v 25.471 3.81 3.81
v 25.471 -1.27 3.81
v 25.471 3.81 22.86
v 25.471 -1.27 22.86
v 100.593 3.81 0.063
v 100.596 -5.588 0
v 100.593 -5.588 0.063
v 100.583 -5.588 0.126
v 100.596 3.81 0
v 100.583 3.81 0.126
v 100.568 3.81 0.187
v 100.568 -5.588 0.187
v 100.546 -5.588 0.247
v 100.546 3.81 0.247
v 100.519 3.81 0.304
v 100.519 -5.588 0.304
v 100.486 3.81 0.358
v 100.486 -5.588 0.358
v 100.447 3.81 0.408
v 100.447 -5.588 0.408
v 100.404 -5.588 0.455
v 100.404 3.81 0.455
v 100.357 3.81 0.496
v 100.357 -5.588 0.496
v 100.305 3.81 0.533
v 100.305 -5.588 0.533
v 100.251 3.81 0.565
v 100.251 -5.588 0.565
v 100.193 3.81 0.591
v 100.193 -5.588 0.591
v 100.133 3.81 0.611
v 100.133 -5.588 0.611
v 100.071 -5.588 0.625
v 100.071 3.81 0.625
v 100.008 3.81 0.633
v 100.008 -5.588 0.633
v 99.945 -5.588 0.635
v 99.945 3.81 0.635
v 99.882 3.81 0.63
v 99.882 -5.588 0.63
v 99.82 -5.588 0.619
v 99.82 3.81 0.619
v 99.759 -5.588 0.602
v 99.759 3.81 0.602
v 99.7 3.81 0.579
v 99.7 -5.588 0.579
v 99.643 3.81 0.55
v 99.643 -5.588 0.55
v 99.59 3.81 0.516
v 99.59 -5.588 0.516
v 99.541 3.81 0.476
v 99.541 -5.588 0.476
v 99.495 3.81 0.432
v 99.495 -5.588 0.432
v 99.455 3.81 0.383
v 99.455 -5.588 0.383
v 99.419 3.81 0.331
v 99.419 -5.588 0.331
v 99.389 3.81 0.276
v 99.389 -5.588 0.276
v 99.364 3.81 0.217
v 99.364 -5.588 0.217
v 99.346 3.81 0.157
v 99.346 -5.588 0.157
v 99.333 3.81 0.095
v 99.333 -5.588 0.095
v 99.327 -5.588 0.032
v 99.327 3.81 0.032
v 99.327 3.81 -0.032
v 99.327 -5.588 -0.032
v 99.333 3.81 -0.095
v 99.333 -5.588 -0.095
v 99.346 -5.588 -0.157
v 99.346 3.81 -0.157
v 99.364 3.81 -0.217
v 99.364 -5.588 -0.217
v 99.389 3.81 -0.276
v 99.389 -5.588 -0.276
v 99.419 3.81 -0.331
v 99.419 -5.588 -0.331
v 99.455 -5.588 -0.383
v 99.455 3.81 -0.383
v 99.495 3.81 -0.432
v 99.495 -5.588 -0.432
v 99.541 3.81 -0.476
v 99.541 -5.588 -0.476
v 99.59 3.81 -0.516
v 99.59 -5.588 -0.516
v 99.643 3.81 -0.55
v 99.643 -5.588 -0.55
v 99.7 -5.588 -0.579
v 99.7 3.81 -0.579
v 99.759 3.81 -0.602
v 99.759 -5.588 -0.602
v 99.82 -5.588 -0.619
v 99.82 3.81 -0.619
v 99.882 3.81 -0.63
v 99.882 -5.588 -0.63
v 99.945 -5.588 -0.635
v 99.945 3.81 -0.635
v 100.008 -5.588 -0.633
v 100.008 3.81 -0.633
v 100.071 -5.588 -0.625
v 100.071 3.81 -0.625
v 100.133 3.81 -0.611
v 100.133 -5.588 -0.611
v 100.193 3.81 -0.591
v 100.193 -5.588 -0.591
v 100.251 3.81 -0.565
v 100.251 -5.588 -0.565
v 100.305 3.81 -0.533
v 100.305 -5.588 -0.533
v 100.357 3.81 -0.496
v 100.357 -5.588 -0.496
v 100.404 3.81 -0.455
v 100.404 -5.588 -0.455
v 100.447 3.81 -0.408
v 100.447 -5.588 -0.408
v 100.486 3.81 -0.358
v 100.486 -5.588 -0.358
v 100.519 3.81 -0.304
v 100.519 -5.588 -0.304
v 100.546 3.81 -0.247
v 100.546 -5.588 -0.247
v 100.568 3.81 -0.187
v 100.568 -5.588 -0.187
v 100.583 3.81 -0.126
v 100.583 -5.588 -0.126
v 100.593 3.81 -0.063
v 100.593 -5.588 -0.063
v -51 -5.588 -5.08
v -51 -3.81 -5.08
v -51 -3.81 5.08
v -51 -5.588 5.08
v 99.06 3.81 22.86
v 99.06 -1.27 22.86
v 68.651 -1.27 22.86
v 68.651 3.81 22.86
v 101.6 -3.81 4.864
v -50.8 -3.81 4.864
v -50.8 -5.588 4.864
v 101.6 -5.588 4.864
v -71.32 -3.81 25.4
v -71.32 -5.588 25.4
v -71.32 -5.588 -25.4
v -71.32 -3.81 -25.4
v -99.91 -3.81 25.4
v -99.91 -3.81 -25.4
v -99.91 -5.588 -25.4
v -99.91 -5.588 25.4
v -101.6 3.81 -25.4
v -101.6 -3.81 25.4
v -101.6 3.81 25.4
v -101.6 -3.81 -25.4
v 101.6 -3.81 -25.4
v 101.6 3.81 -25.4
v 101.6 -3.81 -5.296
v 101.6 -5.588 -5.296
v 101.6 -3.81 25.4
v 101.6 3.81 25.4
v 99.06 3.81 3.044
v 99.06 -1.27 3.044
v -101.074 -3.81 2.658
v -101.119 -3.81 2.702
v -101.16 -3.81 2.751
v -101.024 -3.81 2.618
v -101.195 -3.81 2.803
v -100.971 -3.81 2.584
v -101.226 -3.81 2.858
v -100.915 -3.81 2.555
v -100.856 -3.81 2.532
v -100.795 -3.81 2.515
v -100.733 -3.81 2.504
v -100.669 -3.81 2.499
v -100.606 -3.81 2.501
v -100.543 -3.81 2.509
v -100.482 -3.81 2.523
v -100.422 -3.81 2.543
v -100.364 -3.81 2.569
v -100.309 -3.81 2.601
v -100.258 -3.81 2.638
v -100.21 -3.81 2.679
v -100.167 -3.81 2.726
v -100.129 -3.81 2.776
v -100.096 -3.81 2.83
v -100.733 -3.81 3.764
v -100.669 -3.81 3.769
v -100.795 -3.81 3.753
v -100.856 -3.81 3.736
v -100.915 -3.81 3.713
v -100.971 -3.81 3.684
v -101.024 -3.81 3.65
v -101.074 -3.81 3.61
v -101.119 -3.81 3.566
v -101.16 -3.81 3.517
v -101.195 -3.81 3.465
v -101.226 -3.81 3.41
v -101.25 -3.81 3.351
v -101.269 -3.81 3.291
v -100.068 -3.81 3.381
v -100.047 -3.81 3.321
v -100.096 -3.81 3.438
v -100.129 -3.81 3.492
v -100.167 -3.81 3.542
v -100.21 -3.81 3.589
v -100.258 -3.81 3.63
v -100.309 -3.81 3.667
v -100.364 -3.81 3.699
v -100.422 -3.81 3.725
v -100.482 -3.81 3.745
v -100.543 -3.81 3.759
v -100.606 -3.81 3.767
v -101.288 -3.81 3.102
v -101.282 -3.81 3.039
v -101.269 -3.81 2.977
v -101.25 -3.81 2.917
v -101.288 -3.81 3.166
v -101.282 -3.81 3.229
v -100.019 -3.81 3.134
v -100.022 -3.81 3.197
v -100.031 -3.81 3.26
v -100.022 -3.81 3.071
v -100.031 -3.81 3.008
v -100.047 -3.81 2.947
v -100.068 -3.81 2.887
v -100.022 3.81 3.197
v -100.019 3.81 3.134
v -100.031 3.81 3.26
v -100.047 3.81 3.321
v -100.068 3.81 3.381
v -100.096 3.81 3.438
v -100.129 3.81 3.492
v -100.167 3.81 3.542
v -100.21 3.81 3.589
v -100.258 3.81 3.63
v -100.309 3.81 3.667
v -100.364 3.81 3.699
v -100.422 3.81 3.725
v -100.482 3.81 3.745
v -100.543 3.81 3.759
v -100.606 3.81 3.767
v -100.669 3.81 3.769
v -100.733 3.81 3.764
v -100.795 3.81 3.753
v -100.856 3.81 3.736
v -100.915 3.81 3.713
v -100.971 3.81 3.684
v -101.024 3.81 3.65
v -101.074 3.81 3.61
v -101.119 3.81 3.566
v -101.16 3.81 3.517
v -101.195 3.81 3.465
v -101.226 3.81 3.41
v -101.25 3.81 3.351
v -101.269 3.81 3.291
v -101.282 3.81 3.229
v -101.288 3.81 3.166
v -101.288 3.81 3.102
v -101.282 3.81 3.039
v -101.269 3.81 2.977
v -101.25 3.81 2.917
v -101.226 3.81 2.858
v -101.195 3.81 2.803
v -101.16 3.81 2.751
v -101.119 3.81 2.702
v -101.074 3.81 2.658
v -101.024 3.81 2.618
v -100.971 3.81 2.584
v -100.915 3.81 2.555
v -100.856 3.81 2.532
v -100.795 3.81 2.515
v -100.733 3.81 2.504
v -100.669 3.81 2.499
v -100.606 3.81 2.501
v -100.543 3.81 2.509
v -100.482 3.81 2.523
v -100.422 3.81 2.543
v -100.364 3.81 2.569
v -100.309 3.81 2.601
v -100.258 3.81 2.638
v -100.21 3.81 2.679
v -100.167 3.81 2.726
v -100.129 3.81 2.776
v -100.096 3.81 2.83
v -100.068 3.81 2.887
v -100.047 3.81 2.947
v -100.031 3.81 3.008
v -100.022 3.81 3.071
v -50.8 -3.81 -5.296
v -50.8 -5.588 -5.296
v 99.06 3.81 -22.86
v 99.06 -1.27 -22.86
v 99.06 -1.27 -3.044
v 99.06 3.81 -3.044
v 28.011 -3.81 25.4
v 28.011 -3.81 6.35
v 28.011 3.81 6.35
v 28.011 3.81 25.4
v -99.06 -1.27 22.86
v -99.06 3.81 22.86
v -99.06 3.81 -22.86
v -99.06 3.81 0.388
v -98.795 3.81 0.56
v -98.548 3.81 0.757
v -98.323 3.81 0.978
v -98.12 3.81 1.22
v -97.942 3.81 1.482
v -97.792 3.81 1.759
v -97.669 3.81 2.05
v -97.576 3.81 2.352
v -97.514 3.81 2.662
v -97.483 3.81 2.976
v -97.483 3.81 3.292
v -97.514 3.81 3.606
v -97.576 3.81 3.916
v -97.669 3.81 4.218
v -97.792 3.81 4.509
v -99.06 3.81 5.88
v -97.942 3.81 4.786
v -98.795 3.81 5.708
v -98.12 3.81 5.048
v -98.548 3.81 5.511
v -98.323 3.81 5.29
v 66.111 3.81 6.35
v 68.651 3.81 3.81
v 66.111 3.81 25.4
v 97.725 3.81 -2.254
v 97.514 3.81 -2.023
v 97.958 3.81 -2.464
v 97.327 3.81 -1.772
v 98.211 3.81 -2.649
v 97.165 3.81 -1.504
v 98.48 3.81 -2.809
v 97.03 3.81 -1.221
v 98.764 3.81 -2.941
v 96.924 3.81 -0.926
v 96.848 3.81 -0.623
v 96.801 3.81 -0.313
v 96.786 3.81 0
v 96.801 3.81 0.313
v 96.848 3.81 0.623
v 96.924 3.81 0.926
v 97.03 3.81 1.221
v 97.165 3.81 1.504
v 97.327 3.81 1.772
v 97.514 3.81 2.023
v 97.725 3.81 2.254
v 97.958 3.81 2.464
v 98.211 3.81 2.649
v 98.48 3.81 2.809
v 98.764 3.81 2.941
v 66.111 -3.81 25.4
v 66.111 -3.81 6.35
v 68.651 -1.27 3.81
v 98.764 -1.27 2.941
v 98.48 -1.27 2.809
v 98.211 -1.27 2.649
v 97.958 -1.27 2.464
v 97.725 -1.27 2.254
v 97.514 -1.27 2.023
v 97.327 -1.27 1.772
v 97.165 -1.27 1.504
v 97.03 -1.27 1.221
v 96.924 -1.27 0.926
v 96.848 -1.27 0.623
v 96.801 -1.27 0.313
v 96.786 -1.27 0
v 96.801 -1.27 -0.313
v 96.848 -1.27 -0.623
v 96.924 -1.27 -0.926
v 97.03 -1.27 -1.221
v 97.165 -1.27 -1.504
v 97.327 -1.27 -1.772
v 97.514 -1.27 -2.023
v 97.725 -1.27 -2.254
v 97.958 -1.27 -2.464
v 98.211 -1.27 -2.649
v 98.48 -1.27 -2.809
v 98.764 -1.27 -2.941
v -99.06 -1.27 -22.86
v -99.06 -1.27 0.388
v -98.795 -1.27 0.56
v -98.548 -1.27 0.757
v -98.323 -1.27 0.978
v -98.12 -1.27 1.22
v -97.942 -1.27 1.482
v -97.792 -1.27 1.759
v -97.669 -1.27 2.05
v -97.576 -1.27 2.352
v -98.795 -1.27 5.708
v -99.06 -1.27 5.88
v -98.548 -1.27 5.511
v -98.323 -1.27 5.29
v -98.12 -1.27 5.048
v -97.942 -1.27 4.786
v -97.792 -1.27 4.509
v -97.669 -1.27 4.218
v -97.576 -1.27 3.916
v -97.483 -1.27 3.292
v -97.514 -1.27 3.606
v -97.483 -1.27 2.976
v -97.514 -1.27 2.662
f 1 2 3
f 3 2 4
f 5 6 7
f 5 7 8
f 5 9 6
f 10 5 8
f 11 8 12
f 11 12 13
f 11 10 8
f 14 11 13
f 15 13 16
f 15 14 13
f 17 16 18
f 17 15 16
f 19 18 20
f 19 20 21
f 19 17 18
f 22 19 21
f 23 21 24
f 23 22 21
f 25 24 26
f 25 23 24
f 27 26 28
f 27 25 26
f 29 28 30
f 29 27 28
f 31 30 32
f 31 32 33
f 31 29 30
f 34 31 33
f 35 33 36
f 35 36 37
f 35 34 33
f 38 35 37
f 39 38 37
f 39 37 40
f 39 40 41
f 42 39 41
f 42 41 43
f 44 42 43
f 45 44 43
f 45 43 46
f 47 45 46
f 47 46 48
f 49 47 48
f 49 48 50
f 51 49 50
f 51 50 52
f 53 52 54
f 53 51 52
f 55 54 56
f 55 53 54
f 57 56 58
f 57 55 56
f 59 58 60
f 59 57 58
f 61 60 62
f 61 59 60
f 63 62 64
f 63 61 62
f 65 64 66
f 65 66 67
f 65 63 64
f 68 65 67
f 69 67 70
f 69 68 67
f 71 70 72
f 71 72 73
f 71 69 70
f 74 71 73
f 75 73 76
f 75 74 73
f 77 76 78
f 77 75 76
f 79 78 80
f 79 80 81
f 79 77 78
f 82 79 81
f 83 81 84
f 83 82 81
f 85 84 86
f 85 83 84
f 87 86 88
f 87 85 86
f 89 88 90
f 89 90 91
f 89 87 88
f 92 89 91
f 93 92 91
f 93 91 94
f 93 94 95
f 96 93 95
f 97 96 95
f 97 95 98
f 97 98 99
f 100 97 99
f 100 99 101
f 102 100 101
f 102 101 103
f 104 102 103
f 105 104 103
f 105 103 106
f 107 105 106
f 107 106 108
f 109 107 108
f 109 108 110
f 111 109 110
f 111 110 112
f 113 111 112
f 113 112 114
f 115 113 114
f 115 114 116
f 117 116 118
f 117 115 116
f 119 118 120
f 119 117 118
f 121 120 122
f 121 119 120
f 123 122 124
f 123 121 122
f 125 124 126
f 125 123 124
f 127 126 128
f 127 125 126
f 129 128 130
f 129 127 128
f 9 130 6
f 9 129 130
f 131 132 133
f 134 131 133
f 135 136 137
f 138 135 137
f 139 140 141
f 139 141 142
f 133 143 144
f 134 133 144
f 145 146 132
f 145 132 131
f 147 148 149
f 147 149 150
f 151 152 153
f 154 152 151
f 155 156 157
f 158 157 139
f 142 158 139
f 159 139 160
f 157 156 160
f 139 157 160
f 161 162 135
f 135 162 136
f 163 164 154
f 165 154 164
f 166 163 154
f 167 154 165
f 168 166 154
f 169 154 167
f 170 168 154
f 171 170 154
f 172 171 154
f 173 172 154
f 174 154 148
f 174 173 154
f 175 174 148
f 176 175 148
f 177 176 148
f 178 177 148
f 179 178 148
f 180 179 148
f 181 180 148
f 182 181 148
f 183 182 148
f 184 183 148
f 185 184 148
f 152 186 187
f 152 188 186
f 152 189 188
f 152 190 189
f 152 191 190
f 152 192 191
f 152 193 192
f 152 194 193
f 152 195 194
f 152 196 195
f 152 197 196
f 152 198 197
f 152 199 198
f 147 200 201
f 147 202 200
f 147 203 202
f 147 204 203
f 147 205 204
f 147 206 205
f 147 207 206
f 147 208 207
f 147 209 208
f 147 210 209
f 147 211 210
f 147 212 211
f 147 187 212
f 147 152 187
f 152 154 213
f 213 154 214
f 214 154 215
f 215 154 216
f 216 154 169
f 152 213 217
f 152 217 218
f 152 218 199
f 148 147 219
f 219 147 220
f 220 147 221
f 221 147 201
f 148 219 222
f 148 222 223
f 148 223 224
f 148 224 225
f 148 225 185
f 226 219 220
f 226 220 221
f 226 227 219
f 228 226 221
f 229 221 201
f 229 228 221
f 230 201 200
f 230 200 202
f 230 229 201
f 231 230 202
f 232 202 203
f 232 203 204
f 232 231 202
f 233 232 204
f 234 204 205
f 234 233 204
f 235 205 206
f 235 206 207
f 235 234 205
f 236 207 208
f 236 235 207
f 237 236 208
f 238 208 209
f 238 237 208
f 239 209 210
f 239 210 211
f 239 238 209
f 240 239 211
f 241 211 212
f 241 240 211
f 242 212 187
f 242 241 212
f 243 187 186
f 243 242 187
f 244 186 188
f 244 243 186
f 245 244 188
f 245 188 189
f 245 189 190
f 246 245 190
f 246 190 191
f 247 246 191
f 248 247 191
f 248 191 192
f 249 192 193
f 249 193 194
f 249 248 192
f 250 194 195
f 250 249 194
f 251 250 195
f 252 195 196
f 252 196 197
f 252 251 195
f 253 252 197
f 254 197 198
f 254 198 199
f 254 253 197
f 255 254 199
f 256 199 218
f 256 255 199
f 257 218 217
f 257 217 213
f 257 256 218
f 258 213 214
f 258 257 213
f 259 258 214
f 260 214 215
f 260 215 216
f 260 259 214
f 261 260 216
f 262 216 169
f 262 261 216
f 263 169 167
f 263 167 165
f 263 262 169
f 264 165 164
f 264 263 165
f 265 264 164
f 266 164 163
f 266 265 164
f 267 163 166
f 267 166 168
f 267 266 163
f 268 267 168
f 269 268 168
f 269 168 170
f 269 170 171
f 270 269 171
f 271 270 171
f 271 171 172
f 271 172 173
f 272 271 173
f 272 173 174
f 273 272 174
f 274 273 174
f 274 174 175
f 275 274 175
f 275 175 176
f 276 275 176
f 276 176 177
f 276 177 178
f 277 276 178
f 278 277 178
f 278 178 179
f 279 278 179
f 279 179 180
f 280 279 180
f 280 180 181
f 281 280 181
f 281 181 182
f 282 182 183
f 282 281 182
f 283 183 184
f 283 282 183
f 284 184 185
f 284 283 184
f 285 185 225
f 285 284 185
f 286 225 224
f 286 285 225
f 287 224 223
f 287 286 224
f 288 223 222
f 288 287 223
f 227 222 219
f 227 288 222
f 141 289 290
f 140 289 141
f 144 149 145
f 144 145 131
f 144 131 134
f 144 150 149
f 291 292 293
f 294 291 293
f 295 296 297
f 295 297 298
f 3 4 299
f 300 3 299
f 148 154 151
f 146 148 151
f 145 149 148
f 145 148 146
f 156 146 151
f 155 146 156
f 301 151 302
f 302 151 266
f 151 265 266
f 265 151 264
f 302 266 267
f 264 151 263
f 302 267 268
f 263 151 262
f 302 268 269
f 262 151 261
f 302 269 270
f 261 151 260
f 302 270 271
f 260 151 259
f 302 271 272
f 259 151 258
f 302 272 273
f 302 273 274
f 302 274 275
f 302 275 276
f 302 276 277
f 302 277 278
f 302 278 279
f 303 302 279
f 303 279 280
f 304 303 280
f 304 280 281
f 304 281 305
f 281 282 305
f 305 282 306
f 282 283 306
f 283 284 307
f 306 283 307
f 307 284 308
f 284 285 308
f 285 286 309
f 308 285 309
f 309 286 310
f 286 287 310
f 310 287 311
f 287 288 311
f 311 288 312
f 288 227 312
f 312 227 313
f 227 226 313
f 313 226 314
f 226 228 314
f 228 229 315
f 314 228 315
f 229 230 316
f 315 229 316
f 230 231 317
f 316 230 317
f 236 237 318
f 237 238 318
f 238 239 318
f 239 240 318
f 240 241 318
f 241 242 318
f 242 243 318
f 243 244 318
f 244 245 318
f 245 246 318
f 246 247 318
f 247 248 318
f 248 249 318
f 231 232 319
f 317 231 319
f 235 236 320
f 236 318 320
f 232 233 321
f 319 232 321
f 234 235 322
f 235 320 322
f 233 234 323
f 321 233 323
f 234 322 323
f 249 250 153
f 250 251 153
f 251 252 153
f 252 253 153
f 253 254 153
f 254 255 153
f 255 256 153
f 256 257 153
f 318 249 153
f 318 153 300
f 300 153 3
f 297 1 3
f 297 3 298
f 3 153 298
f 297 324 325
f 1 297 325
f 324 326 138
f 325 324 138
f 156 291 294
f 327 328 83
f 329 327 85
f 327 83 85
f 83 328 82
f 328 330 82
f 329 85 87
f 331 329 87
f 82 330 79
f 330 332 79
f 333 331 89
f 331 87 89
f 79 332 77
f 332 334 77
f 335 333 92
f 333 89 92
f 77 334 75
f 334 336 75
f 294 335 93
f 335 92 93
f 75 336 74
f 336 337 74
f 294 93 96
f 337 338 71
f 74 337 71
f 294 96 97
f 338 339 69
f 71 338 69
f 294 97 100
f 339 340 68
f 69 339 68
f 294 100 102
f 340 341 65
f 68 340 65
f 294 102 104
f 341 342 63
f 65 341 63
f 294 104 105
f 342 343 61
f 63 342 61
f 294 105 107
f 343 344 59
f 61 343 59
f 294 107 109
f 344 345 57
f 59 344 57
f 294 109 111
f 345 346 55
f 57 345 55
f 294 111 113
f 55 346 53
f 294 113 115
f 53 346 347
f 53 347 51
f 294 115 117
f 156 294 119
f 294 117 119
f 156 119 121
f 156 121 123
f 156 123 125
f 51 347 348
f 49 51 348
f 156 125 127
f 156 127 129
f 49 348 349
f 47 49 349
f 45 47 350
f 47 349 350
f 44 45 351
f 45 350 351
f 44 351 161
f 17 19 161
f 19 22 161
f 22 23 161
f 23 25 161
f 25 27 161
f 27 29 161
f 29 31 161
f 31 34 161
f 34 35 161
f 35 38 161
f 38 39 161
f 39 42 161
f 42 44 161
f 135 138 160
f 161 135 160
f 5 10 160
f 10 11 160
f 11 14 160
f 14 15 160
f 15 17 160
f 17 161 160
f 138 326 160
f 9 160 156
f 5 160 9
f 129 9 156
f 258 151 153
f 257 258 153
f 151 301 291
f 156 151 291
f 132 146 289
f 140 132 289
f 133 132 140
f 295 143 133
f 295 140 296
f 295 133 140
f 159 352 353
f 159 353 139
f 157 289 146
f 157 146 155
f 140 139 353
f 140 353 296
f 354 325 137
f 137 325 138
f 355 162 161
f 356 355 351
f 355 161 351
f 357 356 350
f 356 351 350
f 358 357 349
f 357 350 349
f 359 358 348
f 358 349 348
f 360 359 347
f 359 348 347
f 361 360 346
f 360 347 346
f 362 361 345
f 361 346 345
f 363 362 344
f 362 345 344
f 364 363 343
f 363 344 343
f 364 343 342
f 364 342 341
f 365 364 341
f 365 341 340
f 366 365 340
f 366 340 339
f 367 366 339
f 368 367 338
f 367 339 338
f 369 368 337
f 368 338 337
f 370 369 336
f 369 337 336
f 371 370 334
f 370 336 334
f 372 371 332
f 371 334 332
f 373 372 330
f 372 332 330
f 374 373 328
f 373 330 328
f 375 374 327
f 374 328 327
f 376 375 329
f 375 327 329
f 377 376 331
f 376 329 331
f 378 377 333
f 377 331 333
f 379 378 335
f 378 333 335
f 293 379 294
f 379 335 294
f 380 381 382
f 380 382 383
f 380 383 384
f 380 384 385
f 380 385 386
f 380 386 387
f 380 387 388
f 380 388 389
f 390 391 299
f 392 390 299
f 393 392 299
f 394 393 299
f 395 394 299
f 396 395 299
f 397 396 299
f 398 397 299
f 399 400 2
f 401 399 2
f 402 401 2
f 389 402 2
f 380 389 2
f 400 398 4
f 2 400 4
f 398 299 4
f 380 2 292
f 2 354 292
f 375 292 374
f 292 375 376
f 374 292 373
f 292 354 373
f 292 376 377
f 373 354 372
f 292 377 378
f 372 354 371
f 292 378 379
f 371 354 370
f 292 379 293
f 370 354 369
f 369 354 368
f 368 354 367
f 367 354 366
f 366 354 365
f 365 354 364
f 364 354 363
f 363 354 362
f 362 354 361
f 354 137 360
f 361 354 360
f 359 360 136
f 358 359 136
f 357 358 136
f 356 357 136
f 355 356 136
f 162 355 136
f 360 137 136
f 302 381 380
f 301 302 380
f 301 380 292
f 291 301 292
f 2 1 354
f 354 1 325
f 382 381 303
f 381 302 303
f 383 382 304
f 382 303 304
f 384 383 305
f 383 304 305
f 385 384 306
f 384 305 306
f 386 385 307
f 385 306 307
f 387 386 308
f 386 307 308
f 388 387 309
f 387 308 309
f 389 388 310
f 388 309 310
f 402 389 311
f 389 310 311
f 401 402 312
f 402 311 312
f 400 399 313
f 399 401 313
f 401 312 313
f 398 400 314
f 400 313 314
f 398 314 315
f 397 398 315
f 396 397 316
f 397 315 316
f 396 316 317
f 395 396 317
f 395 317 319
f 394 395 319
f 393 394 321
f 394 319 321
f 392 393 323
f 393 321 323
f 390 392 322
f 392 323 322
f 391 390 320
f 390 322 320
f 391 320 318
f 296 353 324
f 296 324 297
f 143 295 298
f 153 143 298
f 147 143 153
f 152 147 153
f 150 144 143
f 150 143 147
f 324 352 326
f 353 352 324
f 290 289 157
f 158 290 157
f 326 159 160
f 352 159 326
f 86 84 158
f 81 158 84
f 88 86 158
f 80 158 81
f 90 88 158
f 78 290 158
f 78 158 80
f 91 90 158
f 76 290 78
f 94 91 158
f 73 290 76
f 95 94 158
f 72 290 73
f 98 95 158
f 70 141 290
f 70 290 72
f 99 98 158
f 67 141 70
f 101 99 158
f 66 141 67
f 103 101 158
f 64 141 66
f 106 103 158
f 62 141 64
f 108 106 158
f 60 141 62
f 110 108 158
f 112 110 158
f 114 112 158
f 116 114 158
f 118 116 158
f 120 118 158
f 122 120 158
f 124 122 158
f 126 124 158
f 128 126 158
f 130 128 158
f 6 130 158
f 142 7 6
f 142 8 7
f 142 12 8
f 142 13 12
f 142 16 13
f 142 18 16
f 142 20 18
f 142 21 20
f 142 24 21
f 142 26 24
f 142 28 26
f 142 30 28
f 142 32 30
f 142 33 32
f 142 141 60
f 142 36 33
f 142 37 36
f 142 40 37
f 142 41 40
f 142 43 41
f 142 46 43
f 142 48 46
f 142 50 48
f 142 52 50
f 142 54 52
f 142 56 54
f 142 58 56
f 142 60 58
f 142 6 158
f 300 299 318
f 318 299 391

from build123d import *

# Parameters (mm, degrees)
F0_R        = 0.635
F1_DEPTH    = 3.81
F2_T        = 2.54
F2_T3_DEPTH = 12.7
F3_W        = 152.4
F3_H        = 10.16
F3_R        = 0.635
F4_DEPTH    = 1.778
F5_W        = 48.9099100232
F5_H        = 50.8
F6_DEPTH    = 1.778
F7_SIZE     = 20.32


# Not quite as in the source:
# - a shell that OpenCascade refuses in one call is made with other operations: the cavity is built on its own and cut out


with BuildPart() as f1:
    # F0 (on Front) → F1 (new body, symmetric)
    with BuildSketch(Plane.XZ):
        Polygon((101.6, -25.4), (101.6, 25.4), (66.1107632279, 25.4), (66.1107632279, 6.35), (28.0107632279, 6.35), (28.0107632279, 25.4), (-101.6, 25.4), (-101.6, -25.4), align=None)
        with Locations((99.9609604478, 0)):
            Circle(F0_R, mode=Mode.SUBTRACT)
        with Locations((-100.653603673, 3.1339845154)):
            Circle(F0_R, mode=Mode.SUBTRACT)
    extrude(amount=F1_DEPTH, both=True)

    # F2: shell of thickness 2.54, made by hand


with BuildPart() as f2_core1:
    # F2_t2: copy of F1
    add(f1.part)

    # the walls: a layer under each face that stays
    f2_faces = [f2_core1.faces().sort_by_distance(p)[0] for p in [
        (101.6, 0, 0),
        (0, 0, -25.4),
        (-101.6, 0, 0),
        (-36.794618386, 0, 25.4),
        (28.0107632279, 0, 15.875),
        (47.0607632279, 0, 6.35),
        (66.1107632279, 0, 15.875),
        (0, -3.81, 0),
        (-101.288603673, 0, 3.1339845154),
        (99.3259604478, 0, 0),
        (83.855381614, 0, 25.4),
    ]]
    thicken(f2_faces, amount=-F2_T, mode=Mode.SUBTRACT)

    # F2_s4 → F2_t3 (cut)
    with BuildSketch(Plane.XZ.offset(-6.35)):
        Polygon((28.0361632279, 6.3754), (25.4707632279, 6.35), (25.4707632279, 3.81), (28.0107632279, 3.81), align=None)
        Polygon((66.0853632279, 6.3754), (66.1107632279, 3.81), (68.6507632279, 3.81), (68.6507632279, 6.35), align=None)
    extrude(amount=F2_T3_DEPTH, mode=Mode.SUBTRACT)


with BuildPart() as f1_1:
    add(f1.part)

    # what is left inside the walls is the cavity
    f2_cavity = [f2_core1.part.solids().sort_by_distance(p)[0] for p in [
        (0, 3.7846, -7.62),
    ]]
    add(f2_cavity, mode=Mode.SUBTRACT)

    # F3 (on face) → F4 (join)
    with BuildSketch(Plane.XZ.offset(3.81)):
        with Locations((25.4, -0.2157475356)):
            Rectangle(F3_W, F3_H)
        with Locations((99.9609604478, 0)):
            Circle(F3_R, mode=Mode.SUBTRACT)
    extrude(amount=F4_DEPTH)

    # F5 (on face) → F6 (join)
    with BuildSketch(Plane.XZ.offset(3.81)):
        with Locations((-75.4546709359, 0)):
            Rectangle(F5_W, F5_H)
    extrude(amount=F6_DEPTH)

    # F7
    f7_edges = [f1_1.edges().sort_by_distance(p)[0] for p in [
        (-50.999716, -4.699, 25.4),
        (-50.999716, -4.699, -25.4),
    ]]
    chamfer(f7_edges, length=F7_SIZE)


solid = f1_1.part
